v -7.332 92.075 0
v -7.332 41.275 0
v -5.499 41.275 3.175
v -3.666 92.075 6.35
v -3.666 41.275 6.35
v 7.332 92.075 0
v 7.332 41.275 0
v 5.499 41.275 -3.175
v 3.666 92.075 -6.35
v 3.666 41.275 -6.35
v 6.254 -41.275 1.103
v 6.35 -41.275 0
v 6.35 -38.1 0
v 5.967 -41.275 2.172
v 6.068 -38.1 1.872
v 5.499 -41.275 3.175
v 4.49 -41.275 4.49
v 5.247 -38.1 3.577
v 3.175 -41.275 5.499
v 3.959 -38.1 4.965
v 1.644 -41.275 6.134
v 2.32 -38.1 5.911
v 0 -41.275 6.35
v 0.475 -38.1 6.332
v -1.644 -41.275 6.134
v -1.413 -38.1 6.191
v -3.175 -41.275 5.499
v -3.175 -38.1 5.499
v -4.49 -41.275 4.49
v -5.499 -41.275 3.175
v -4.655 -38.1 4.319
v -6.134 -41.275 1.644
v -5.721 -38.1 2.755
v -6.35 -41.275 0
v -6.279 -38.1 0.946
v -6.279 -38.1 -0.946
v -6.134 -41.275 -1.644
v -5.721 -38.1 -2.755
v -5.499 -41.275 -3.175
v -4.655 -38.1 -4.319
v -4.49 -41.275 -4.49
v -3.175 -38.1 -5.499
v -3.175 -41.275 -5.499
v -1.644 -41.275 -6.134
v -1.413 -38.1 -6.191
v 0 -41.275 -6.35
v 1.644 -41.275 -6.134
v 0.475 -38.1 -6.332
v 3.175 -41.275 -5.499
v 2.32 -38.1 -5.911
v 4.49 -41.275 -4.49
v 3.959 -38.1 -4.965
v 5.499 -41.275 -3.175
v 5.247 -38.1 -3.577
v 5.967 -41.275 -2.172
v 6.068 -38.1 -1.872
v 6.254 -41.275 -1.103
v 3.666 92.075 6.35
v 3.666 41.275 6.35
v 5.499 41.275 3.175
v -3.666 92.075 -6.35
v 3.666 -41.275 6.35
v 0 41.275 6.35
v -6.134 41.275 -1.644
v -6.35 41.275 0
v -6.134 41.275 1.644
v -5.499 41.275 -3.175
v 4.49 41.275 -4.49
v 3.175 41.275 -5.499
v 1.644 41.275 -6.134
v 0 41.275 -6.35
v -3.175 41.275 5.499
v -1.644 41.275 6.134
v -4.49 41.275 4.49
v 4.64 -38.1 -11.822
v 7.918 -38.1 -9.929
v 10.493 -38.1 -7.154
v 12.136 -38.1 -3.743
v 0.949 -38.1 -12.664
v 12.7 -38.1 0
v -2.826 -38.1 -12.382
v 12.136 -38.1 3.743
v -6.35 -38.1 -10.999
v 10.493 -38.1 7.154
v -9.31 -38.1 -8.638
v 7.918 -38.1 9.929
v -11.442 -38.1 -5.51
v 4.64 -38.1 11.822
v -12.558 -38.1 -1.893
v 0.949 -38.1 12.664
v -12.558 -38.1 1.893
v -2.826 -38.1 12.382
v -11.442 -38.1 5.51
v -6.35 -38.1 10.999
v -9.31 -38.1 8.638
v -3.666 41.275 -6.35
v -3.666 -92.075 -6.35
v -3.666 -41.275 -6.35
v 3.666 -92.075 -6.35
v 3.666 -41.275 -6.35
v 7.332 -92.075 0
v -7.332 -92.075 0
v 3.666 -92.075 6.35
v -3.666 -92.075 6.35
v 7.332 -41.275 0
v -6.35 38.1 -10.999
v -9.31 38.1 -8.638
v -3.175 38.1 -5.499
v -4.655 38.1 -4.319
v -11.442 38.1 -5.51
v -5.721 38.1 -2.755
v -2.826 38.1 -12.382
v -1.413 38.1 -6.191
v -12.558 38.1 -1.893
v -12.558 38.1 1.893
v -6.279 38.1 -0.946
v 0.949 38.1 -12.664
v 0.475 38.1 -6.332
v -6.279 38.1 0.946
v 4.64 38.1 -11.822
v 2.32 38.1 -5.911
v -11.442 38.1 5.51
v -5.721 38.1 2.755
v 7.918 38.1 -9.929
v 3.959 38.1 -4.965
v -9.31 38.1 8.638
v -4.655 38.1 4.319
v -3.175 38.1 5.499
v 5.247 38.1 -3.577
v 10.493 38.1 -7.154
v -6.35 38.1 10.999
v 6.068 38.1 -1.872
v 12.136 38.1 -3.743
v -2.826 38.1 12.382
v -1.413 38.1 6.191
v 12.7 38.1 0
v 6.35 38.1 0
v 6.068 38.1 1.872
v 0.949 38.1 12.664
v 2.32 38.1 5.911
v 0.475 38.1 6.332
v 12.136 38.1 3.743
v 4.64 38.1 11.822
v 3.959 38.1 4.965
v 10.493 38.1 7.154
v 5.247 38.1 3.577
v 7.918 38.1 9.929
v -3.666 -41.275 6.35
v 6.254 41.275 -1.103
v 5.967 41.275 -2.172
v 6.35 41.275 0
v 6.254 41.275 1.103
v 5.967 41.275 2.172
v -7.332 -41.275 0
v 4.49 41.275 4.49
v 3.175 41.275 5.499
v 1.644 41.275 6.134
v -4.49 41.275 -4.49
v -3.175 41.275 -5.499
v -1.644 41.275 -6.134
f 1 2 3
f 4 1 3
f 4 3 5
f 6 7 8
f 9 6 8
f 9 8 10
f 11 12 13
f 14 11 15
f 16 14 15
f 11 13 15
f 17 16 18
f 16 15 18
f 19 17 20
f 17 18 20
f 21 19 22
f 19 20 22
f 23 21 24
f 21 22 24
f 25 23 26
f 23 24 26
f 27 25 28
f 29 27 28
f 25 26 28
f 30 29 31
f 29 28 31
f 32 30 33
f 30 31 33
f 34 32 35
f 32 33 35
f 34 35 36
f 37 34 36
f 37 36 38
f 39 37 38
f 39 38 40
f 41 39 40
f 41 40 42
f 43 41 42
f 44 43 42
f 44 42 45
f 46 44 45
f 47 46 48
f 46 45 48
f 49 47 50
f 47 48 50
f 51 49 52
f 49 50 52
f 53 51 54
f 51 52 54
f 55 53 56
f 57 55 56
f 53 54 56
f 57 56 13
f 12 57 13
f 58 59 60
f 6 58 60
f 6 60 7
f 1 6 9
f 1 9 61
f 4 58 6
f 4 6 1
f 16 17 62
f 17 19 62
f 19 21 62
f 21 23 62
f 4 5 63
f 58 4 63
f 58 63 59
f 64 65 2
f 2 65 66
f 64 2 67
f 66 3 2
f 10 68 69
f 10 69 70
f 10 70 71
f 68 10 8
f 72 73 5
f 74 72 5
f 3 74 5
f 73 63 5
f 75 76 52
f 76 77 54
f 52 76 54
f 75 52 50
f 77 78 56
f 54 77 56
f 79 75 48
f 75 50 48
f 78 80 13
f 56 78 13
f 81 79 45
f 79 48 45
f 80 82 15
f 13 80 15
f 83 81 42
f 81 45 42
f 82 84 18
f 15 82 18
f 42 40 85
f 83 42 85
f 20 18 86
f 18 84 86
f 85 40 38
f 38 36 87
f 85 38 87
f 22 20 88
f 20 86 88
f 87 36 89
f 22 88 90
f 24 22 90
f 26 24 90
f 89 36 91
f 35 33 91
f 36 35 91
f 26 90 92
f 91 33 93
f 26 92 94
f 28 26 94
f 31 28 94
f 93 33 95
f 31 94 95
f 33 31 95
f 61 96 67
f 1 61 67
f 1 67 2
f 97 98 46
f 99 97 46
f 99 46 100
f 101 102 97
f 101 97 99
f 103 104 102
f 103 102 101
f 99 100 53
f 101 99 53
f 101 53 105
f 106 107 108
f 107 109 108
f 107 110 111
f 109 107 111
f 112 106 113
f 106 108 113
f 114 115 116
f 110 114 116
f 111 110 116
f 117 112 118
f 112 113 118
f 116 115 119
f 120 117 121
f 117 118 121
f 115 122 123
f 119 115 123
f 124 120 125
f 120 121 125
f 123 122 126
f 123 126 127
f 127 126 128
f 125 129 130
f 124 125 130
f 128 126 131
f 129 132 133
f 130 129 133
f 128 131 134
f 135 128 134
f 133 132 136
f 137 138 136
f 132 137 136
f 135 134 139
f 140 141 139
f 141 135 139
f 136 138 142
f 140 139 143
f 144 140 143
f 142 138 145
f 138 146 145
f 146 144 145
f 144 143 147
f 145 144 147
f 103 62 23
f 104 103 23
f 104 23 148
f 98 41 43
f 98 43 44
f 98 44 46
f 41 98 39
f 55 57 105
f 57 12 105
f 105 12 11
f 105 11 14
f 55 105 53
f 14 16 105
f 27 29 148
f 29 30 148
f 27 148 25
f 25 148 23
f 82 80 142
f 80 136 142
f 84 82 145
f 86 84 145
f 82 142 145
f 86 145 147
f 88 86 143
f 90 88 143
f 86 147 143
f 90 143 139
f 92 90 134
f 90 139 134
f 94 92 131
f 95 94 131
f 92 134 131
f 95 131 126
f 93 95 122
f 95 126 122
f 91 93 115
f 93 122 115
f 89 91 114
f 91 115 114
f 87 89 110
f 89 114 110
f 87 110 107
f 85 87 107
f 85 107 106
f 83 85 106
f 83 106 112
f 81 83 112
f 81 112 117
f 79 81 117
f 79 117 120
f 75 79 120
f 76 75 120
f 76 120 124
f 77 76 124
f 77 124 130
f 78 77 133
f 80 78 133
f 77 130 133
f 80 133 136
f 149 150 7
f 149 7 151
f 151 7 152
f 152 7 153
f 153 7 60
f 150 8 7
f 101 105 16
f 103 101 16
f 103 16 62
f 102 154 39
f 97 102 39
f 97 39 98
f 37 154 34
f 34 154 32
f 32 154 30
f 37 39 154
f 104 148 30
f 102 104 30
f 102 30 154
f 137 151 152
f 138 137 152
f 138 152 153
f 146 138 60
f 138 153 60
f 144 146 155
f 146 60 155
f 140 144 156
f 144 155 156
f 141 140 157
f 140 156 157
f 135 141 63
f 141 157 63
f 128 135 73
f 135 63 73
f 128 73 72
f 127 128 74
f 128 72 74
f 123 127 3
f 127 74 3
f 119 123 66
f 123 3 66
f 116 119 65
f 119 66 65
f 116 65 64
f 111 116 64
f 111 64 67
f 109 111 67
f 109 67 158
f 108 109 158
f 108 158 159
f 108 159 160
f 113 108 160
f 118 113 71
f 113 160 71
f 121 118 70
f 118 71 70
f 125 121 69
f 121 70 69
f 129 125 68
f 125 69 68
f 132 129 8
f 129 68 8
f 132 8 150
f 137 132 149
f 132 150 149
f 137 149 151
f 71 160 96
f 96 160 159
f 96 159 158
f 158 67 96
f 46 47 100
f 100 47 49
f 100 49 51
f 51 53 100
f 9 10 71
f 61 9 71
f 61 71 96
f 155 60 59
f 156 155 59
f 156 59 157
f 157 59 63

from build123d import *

# Parameters (mm, degrees)
F0_W     = 6.35
F0_H     = 3.175
F3_DEPTH = 50.8
F5_DEPTH = 50.8


with BuildPart() as f1:
    # F0 (on Top) → F1 (revolve)
    with BuildSketch(Plane.XY):
        with Locations((3.175, 39.6875)):
            Rectangle(F0_W, F0_H)
        Polygon((6.35, 38.1), (0, 38.1), (0, -38.1), (6.35, -38.1), (12.7, -38.1), (12.7, 38.1), align=None)
        with Locations((3.175, -39.6875)):
            Rectangle(F0_W, F0_H)
    revolve(axis=Axis((0, 0, 0), (0, -1, 0)))

    # F2 (on face) → F3 (join)
    with BuildSketch(Plane(origin=(0, 41.275, 0), x_dir=(-1, 0, 0), z_dir=(0, 1, 0))):
        Polygon((7.332348, 0), (3.666174, 6.35), (-3.666174, 6.35), (-7.332348, 0), (-3.666174, -6.35), (3.666174, -6.35), align=None)
    extrude(amount=F3_DEPTH)

    # F4 (on face) → F5 (join)
    with BuildSketch(Plane.XZ.offset(41.275)):
        Polygon((7.332348, 0), (3.666174, 6.35), (-3.666174, 6.35), (-7.332348, 0), (-3.666174, -6.35), (3.666174, -6.35), align=None)
    extrude(amount=F5_DEPTH)


solid = f1.part
